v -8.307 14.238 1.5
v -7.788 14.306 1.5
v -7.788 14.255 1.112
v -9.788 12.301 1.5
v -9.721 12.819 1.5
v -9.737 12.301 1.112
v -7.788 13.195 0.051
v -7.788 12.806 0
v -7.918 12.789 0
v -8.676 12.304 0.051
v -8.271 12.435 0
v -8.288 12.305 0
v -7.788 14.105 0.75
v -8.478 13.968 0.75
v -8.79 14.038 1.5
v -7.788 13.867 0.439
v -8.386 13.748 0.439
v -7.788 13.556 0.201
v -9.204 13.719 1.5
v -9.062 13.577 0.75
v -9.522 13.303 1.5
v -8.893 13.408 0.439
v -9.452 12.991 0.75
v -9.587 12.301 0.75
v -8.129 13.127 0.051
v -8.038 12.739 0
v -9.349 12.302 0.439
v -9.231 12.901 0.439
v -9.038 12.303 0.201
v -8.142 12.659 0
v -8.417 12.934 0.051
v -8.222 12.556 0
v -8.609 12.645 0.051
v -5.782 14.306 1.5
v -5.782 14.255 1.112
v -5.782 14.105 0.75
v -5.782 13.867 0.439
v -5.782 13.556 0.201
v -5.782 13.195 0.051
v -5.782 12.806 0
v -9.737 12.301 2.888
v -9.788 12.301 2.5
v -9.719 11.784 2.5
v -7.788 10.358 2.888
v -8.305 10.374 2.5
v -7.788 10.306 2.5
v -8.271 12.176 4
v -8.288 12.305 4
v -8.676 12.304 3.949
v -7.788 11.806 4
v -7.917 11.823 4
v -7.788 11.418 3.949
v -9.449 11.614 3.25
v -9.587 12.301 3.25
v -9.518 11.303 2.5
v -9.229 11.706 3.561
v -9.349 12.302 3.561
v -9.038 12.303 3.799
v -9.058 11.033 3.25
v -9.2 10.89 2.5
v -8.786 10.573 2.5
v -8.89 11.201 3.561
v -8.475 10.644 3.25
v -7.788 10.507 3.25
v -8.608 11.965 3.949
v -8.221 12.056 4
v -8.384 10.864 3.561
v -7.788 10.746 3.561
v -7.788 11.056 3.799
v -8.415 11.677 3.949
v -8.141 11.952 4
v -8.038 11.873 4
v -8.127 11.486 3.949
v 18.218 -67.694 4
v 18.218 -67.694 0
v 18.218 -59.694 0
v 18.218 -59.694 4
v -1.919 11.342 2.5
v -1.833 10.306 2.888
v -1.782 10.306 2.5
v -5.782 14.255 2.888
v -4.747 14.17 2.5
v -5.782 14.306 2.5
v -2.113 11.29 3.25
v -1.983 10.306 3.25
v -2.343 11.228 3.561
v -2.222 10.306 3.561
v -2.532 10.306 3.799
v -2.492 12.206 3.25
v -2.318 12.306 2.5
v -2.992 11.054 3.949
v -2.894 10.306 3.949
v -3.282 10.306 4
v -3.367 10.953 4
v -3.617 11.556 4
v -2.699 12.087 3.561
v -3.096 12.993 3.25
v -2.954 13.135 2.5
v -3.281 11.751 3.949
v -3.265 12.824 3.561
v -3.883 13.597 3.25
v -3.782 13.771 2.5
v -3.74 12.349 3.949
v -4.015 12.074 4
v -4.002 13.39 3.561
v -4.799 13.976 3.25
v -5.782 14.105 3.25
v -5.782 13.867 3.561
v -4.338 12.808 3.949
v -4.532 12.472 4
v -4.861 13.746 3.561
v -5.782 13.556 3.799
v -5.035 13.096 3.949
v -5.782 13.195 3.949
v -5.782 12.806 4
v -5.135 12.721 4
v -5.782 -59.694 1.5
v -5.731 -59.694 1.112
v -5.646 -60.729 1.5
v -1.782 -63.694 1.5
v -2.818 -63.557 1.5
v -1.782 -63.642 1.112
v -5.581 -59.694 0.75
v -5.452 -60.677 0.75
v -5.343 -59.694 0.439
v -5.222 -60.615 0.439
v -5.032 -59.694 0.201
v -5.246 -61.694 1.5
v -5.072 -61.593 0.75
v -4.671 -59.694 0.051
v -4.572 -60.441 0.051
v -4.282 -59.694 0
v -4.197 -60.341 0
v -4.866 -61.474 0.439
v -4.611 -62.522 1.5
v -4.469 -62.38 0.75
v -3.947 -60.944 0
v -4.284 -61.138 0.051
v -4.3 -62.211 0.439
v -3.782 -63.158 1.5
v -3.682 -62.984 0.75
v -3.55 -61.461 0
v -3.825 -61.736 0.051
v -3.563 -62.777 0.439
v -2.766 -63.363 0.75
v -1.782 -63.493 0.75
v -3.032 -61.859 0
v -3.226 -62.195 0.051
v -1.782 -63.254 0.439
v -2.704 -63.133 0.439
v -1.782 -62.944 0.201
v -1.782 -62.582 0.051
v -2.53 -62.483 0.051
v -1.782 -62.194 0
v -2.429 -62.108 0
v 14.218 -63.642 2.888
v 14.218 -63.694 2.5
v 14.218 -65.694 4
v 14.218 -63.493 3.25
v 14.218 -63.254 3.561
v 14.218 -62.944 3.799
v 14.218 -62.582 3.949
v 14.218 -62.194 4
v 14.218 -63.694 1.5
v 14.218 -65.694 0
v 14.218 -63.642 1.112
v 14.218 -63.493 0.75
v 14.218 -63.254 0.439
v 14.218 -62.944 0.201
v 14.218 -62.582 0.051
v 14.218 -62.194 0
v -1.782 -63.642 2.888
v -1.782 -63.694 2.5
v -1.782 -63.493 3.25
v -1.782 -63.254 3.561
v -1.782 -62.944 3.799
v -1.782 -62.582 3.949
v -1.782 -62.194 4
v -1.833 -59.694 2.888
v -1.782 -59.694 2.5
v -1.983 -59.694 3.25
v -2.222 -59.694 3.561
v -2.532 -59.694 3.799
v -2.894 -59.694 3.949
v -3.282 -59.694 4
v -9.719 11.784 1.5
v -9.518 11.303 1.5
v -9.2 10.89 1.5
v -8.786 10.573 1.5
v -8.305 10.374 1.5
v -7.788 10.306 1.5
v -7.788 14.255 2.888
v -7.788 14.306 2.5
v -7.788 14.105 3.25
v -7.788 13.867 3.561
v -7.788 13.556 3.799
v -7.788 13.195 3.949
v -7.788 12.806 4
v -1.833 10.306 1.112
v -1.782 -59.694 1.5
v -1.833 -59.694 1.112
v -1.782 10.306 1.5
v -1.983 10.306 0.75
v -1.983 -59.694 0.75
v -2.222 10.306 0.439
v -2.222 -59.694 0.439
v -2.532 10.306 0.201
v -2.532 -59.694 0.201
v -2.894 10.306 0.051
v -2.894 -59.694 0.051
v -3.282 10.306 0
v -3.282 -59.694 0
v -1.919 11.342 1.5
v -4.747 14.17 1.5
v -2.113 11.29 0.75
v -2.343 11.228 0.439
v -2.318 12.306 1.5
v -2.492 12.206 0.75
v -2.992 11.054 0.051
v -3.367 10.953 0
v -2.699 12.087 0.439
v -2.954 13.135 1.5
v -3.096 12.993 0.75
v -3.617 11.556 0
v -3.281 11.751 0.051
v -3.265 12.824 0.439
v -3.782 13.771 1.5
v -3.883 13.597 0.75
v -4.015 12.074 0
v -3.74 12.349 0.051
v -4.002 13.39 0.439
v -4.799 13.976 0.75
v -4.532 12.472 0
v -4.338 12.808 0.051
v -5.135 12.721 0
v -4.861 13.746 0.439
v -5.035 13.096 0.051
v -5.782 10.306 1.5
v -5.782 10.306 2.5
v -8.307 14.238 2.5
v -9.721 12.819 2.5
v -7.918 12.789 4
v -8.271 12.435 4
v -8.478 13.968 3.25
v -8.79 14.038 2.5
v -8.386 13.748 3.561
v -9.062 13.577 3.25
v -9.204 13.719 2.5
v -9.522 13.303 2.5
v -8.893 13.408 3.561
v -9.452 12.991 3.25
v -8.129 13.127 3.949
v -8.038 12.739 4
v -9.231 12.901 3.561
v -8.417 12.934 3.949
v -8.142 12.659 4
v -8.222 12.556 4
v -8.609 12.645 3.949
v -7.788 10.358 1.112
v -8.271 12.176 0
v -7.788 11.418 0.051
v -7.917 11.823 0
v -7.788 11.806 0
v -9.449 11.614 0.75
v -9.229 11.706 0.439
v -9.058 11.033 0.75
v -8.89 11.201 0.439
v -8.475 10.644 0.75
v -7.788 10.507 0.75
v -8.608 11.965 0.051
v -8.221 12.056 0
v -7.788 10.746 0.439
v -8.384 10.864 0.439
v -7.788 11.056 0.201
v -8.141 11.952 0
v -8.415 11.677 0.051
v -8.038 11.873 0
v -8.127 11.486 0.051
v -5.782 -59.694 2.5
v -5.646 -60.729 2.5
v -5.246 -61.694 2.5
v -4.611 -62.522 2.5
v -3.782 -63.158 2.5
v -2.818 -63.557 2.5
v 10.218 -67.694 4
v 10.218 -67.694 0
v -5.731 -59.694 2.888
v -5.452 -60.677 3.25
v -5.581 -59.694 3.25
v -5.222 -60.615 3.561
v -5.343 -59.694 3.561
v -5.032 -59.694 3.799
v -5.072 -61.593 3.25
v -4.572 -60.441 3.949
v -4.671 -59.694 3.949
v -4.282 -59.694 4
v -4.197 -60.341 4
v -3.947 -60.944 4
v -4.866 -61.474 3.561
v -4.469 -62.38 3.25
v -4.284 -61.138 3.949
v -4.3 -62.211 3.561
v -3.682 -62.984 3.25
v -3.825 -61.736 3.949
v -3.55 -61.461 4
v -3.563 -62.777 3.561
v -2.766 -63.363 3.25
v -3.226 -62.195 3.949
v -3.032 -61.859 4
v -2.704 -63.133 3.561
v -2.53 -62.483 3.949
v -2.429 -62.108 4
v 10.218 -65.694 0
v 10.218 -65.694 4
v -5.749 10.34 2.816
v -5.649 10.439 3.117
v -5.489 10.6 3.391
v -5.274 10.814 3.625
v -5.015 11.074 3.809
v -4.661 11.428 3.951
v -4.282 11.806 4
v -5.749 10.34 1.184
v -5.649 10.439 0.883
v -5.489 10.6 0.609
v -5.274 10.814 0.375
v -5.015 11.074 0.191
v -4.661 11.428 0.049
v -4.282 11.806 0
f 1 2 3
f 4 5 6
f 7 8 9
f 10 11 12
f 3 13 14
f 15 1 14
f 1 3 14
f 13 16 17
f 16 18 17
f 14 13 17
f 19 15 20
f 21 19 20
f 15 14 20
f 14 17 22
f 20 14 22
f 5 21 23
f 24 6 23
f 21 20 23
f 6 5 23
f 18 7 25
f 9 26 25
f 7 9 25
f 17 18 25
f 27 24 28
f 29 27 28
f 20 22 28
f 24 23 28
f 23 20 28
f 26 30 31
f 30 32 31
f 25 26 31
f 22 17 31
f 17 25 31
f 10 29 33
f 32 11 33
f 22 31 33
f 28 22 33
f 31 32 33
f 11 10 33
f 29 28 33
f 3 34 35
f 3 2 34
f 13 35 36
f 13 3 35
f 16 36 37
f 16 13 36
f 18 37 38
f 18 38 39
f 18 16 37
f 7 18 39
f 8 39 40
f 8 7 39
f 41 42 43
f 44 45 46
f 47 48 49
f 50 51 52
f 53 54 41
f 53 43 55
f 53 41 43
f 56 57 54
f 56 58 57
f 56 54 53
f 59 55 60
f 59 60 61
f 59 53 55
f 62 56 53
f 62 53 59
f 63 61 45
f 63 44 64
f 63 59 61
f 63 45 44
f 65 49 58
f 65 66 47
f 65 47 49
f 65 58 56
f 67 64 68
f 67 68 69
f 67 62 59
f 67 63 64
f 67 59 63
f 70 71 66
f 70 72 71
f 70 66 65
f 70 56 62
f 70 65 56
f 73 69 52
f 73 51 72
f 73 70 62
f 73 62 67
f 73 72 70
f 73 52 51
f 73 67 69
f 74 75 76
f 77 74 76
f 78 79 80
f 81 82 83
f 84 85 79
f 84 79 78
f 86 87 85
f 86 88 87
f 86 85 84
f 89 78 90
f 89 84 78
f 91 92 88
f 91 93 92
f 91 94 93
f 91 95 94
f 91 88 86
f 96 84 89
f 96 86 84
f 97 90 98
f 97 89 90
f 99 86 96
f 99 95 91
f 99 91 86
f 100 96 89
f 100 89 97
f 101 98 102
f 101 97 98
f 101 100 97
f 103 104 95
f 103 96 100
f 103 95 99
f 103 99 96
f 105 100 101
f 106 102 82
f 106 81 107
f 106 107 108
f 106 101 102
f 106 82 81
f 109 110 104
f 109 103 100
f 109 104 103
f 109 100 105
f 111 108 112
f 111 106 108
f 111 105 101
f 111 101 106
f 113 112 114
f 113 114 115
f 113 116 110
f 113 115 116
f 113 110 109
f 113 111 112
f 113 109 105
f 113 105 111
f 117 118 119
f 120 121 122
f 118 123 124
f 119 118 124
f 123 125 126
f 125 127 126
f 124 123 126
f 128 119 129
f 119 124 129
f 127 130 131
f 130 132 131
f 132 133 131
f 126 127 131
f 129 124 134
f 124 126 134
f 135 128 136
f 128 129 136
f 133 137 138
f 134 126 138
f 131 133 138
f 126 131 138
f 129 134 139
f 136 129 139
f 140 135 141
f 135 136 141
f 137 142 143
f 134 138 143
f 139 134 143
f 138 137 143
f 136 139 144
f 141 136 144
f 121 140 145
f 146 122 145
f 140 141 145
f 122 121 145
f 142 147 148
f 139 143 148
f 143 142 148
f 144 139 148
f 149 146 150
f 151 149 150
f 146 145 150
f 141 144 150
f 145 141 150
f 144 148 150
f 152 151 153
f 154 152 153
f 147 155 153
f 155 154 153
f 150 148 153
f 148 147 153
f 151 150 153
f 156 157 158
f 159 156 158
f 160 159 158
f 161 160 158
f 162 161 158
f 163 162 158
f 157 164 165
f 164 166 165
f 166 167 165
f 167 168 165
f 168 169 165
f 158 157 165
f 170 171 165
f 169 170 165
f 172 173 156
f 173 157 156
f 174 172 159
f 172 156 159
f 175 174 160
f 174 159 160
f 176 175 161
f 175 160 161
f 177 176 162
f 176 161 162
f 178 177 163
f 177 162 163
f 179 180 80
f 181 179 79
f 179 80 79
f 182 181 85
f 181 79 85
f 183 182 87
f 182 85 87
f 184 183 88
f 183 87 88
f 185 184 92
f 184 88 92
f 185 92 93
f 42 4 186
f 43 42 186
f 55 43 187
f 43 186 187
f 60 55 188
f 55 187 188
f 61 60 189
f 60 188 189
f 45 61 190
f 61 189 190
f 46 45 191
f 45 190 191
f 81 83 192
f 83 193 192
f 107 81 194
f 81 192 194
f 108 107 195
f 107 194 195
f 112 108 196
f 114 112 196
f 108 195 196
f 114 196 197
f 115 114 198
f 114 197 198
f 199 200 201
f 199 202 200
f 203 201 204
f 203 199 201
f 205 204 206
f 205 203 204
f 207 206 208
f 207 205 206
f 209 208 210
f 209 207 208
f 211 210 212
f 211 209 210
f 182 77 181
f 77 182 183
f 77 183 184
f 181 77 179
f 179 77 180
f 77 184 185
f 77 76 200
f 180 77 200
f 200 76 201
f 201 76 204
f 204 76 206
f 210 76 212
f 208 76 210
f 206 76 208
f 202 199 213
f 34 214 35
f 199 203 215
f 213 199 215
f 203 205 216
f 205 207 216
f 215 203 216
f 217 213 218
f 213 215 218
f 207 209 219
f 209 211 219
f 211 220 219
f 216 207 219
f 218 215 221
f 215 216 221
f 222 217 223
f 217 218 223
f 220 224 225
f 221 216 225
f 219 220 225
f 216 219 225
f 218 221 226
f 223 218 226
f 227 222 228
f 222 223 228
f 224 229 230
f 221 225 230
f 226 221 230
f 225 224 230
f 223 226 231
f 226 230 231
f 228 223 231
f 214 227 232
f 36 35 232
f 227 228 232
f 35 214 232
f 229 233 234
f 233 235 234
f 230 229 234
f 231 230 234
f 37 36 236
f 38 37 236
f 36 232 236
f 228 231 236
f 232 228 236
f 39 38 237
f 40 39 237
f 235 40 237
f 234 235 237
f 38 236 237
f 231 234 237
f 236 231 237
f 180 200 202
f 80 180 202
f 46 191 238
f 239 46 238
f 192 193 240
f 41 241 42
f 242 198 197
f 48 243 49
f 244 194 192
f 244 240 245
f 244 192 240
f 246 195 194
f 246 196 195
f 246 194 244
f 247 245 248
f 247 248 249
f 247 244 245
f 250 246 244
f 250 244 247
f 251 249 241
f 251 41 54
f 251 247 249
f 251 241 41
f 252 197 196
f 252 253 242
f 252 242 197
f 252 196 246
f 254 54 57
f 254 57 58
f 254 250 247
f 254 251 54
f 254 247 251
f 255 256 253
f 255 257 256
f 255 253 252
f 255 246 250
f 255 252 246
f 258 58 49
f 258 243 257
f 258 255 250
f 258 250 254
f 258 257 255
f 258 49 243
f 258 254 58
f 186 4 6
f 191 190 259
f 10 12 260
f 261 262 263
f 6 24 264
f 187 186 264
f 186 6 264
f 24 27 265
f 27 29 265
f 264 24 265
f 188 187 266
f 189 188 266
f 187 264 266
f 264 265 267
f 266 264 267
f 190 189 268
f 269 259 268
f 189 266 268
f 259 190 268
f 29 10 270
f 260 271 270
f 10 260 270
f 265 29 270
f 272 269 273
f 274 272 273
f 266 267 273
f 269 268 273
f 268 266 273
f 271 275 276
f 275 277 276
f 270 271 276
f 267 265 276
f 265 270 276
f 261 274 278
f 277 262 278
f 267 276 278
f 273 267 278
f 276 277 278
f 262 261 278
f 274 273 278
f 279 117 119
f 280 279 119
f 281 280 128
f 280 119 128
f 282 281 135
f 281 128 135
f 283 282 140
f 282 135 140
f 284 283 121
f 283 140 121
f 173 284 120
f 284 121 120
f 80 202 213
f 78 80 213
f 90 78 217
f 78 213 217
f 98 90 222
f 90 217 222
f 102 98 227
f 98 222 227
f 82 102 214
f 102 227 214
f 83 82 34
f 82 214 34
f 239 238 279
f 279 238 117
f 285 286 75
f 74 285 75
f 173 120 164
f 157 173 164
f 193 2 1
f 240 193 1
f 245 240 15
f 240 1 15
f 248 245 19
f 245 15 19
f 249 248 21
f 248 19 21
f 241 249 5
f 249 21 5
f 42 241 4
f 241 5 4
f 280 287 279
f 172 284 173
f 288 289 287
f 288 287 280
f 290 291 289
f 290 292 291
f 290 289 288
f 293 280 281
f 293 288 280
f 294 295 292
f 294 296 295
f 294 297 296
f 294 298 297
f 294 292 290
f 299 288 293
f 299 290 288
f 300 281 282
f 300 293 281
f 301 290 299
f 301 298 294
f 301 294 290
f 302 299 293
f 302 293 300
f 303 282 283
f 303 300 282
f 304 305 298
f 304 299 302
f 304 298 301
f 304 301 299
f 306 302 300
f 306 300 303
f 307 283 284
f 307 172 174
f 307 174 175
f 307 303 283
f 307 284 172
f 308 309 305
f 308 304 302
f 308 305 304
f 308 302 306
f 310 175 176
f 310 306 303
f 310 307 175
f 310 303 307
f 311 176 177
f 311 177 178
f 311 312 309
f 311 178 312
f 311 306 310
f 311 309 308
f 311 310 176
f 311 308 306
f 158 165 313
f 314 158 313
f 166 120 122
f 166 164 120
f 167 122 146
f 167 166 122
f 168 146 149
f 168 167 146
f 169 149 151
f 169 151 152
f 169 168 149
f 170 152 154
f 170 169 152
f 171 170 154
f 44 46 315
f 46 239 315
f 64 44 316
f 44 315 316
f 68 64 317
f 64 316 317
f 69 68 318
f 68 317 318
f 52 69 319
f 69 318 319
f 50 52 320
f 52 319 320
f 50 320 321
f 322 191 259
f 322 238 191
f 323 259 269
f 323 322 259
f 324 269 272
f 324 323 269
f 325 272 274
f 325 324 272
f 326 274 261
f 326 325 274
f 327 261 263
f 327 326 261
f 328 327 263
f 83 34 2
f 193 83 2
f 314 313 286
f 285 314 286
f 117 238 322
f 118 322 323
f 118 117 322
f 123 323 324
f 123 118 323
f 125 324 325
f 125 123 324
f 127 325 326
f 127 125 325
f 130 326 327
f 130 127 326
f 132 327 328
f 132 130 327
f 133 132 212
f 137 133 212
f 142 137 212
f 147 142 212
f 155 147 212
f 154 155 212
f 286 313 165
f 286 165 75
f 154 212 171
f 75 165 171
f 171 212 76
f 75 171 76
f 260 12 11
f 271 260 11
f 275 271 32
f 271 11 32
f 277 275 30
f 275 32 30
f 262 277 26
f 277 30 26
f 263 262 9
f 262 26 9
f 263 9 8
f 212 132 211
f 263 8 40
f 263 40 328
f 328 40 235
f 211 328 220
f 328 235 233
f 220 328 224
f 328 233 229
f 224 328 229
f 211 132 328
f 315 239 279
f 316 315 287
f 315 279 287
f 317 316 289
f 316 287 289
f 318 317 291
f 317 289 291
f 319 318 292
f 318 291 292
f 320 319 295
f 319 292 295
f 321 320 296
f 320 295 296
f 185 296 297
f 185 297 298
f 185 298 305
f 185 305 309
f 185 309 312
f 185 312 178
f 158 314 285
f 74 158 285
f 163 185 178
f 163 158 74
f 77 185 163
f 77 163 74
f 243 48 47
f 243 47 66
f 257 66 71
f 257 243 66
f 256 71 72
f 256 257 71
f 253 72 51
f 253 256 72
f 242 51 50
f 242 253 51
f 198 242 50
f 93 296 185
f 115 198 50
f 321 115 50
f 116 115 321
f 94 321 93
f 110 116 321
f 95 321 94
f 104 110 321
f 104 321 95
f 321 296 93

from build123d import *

# Parameters (mm, degrees)
F1_DEPTH = 4
F2_R     = 1.5


# Not quite as in the source:
# - ends of sketch curves that miss each other by under 0.0002 mm in the source are joined


with BuildPart() as f1:
    # F0 (on Top) → F1 (new body)
    with BuildSketch(Plane.XY):
        with BuildLine():
            Line((-5.7822973108, 10.3064593036), (-5.7822973108, 0))
            Line((-5.7822973108, 0), (-5.7822973108, -59.6935572128))
            ThreePointArc((-5.7822973108, -59.6935572128), (-4.6107244356, -62.5219843376), (-1.7822973108, -63.6935572128))
            Line((-1.7822973108, -63.6935572128), (14.2177026892, -63.6935572128))
            Line((14.2177026892, -63.6935572128), (14.2177026892, -65.6935572128))
            Line((14.2177026892, -65.6935572128), (10.2177026892, -65.6935572128))
            Line((10.2177026892, -65.6935572128), (10.2177026892, -67.6935572128))
            Line((10.2177026892, -67.6935572128), (18.2177026892, -67.6935572128))
            Line((18.2177026892, -67.6935572128), (18.2177026892, -59.6935572128))
            Line((18.2177026892, -59.6935572128), (-1.7822973108, -59.6935572128))
            Line((-1.7822973108, -59.6935572128), (-1.7822973108, 10.3064427872))
            ThreePointArc((-1.7822973108, 10.3064427872), (-2.9538701861, 13.1348699119), (-5.7822973108, 14.3064427872))
            Line((-5.7822973108, 14.3064427872), (-7.7880364463, 14.3064427872))
            ThreePointArc((-7.7880364463, 14.3064427872), (-9.2042805699, 13.7186228687), (-9.7880281881, 12.3006953697))
            ThreePointArc((-9.7880281881, 12.3006953697), (-9.2002165753, 10.8902151801), (-7.7880364938, 10.3064593036))
            Line((-7.7880364938, 10.3064593036), (-5.7822973108, 10.3064593036))
        make_face()
    extrude(amount=F1_DEPTH)

    # F2
    f2_edges = [f1.edges().sort_by_distance(p)[0] for p in [
        (-5.782297, -24.693549, 4),
        (-1.782297, -24.693557, 4),
        (-2.95387, 13.13487, 4),
        (-6.785167, 14.306443, 4),
        (-9.204281, 13.718623, 4),
        (-9.200211, 10.890209, 4),
        (-6.785167, 10.306459, 4),
        (-1.782297, -24.693557, 0),
        (-2.95387, 13.13487, 0),
        (-6.785167, 14.306443, 0),
        (-9.204281, 13.718623, 0),
        (-9.200211, 10.890209, 0),
        (-6.785167, 10.306459, 0),
        (-5.782297, -24.693549, 0),
    ]]
    fillet(f2_edges, radius=F2_R)


solid = f1.part
